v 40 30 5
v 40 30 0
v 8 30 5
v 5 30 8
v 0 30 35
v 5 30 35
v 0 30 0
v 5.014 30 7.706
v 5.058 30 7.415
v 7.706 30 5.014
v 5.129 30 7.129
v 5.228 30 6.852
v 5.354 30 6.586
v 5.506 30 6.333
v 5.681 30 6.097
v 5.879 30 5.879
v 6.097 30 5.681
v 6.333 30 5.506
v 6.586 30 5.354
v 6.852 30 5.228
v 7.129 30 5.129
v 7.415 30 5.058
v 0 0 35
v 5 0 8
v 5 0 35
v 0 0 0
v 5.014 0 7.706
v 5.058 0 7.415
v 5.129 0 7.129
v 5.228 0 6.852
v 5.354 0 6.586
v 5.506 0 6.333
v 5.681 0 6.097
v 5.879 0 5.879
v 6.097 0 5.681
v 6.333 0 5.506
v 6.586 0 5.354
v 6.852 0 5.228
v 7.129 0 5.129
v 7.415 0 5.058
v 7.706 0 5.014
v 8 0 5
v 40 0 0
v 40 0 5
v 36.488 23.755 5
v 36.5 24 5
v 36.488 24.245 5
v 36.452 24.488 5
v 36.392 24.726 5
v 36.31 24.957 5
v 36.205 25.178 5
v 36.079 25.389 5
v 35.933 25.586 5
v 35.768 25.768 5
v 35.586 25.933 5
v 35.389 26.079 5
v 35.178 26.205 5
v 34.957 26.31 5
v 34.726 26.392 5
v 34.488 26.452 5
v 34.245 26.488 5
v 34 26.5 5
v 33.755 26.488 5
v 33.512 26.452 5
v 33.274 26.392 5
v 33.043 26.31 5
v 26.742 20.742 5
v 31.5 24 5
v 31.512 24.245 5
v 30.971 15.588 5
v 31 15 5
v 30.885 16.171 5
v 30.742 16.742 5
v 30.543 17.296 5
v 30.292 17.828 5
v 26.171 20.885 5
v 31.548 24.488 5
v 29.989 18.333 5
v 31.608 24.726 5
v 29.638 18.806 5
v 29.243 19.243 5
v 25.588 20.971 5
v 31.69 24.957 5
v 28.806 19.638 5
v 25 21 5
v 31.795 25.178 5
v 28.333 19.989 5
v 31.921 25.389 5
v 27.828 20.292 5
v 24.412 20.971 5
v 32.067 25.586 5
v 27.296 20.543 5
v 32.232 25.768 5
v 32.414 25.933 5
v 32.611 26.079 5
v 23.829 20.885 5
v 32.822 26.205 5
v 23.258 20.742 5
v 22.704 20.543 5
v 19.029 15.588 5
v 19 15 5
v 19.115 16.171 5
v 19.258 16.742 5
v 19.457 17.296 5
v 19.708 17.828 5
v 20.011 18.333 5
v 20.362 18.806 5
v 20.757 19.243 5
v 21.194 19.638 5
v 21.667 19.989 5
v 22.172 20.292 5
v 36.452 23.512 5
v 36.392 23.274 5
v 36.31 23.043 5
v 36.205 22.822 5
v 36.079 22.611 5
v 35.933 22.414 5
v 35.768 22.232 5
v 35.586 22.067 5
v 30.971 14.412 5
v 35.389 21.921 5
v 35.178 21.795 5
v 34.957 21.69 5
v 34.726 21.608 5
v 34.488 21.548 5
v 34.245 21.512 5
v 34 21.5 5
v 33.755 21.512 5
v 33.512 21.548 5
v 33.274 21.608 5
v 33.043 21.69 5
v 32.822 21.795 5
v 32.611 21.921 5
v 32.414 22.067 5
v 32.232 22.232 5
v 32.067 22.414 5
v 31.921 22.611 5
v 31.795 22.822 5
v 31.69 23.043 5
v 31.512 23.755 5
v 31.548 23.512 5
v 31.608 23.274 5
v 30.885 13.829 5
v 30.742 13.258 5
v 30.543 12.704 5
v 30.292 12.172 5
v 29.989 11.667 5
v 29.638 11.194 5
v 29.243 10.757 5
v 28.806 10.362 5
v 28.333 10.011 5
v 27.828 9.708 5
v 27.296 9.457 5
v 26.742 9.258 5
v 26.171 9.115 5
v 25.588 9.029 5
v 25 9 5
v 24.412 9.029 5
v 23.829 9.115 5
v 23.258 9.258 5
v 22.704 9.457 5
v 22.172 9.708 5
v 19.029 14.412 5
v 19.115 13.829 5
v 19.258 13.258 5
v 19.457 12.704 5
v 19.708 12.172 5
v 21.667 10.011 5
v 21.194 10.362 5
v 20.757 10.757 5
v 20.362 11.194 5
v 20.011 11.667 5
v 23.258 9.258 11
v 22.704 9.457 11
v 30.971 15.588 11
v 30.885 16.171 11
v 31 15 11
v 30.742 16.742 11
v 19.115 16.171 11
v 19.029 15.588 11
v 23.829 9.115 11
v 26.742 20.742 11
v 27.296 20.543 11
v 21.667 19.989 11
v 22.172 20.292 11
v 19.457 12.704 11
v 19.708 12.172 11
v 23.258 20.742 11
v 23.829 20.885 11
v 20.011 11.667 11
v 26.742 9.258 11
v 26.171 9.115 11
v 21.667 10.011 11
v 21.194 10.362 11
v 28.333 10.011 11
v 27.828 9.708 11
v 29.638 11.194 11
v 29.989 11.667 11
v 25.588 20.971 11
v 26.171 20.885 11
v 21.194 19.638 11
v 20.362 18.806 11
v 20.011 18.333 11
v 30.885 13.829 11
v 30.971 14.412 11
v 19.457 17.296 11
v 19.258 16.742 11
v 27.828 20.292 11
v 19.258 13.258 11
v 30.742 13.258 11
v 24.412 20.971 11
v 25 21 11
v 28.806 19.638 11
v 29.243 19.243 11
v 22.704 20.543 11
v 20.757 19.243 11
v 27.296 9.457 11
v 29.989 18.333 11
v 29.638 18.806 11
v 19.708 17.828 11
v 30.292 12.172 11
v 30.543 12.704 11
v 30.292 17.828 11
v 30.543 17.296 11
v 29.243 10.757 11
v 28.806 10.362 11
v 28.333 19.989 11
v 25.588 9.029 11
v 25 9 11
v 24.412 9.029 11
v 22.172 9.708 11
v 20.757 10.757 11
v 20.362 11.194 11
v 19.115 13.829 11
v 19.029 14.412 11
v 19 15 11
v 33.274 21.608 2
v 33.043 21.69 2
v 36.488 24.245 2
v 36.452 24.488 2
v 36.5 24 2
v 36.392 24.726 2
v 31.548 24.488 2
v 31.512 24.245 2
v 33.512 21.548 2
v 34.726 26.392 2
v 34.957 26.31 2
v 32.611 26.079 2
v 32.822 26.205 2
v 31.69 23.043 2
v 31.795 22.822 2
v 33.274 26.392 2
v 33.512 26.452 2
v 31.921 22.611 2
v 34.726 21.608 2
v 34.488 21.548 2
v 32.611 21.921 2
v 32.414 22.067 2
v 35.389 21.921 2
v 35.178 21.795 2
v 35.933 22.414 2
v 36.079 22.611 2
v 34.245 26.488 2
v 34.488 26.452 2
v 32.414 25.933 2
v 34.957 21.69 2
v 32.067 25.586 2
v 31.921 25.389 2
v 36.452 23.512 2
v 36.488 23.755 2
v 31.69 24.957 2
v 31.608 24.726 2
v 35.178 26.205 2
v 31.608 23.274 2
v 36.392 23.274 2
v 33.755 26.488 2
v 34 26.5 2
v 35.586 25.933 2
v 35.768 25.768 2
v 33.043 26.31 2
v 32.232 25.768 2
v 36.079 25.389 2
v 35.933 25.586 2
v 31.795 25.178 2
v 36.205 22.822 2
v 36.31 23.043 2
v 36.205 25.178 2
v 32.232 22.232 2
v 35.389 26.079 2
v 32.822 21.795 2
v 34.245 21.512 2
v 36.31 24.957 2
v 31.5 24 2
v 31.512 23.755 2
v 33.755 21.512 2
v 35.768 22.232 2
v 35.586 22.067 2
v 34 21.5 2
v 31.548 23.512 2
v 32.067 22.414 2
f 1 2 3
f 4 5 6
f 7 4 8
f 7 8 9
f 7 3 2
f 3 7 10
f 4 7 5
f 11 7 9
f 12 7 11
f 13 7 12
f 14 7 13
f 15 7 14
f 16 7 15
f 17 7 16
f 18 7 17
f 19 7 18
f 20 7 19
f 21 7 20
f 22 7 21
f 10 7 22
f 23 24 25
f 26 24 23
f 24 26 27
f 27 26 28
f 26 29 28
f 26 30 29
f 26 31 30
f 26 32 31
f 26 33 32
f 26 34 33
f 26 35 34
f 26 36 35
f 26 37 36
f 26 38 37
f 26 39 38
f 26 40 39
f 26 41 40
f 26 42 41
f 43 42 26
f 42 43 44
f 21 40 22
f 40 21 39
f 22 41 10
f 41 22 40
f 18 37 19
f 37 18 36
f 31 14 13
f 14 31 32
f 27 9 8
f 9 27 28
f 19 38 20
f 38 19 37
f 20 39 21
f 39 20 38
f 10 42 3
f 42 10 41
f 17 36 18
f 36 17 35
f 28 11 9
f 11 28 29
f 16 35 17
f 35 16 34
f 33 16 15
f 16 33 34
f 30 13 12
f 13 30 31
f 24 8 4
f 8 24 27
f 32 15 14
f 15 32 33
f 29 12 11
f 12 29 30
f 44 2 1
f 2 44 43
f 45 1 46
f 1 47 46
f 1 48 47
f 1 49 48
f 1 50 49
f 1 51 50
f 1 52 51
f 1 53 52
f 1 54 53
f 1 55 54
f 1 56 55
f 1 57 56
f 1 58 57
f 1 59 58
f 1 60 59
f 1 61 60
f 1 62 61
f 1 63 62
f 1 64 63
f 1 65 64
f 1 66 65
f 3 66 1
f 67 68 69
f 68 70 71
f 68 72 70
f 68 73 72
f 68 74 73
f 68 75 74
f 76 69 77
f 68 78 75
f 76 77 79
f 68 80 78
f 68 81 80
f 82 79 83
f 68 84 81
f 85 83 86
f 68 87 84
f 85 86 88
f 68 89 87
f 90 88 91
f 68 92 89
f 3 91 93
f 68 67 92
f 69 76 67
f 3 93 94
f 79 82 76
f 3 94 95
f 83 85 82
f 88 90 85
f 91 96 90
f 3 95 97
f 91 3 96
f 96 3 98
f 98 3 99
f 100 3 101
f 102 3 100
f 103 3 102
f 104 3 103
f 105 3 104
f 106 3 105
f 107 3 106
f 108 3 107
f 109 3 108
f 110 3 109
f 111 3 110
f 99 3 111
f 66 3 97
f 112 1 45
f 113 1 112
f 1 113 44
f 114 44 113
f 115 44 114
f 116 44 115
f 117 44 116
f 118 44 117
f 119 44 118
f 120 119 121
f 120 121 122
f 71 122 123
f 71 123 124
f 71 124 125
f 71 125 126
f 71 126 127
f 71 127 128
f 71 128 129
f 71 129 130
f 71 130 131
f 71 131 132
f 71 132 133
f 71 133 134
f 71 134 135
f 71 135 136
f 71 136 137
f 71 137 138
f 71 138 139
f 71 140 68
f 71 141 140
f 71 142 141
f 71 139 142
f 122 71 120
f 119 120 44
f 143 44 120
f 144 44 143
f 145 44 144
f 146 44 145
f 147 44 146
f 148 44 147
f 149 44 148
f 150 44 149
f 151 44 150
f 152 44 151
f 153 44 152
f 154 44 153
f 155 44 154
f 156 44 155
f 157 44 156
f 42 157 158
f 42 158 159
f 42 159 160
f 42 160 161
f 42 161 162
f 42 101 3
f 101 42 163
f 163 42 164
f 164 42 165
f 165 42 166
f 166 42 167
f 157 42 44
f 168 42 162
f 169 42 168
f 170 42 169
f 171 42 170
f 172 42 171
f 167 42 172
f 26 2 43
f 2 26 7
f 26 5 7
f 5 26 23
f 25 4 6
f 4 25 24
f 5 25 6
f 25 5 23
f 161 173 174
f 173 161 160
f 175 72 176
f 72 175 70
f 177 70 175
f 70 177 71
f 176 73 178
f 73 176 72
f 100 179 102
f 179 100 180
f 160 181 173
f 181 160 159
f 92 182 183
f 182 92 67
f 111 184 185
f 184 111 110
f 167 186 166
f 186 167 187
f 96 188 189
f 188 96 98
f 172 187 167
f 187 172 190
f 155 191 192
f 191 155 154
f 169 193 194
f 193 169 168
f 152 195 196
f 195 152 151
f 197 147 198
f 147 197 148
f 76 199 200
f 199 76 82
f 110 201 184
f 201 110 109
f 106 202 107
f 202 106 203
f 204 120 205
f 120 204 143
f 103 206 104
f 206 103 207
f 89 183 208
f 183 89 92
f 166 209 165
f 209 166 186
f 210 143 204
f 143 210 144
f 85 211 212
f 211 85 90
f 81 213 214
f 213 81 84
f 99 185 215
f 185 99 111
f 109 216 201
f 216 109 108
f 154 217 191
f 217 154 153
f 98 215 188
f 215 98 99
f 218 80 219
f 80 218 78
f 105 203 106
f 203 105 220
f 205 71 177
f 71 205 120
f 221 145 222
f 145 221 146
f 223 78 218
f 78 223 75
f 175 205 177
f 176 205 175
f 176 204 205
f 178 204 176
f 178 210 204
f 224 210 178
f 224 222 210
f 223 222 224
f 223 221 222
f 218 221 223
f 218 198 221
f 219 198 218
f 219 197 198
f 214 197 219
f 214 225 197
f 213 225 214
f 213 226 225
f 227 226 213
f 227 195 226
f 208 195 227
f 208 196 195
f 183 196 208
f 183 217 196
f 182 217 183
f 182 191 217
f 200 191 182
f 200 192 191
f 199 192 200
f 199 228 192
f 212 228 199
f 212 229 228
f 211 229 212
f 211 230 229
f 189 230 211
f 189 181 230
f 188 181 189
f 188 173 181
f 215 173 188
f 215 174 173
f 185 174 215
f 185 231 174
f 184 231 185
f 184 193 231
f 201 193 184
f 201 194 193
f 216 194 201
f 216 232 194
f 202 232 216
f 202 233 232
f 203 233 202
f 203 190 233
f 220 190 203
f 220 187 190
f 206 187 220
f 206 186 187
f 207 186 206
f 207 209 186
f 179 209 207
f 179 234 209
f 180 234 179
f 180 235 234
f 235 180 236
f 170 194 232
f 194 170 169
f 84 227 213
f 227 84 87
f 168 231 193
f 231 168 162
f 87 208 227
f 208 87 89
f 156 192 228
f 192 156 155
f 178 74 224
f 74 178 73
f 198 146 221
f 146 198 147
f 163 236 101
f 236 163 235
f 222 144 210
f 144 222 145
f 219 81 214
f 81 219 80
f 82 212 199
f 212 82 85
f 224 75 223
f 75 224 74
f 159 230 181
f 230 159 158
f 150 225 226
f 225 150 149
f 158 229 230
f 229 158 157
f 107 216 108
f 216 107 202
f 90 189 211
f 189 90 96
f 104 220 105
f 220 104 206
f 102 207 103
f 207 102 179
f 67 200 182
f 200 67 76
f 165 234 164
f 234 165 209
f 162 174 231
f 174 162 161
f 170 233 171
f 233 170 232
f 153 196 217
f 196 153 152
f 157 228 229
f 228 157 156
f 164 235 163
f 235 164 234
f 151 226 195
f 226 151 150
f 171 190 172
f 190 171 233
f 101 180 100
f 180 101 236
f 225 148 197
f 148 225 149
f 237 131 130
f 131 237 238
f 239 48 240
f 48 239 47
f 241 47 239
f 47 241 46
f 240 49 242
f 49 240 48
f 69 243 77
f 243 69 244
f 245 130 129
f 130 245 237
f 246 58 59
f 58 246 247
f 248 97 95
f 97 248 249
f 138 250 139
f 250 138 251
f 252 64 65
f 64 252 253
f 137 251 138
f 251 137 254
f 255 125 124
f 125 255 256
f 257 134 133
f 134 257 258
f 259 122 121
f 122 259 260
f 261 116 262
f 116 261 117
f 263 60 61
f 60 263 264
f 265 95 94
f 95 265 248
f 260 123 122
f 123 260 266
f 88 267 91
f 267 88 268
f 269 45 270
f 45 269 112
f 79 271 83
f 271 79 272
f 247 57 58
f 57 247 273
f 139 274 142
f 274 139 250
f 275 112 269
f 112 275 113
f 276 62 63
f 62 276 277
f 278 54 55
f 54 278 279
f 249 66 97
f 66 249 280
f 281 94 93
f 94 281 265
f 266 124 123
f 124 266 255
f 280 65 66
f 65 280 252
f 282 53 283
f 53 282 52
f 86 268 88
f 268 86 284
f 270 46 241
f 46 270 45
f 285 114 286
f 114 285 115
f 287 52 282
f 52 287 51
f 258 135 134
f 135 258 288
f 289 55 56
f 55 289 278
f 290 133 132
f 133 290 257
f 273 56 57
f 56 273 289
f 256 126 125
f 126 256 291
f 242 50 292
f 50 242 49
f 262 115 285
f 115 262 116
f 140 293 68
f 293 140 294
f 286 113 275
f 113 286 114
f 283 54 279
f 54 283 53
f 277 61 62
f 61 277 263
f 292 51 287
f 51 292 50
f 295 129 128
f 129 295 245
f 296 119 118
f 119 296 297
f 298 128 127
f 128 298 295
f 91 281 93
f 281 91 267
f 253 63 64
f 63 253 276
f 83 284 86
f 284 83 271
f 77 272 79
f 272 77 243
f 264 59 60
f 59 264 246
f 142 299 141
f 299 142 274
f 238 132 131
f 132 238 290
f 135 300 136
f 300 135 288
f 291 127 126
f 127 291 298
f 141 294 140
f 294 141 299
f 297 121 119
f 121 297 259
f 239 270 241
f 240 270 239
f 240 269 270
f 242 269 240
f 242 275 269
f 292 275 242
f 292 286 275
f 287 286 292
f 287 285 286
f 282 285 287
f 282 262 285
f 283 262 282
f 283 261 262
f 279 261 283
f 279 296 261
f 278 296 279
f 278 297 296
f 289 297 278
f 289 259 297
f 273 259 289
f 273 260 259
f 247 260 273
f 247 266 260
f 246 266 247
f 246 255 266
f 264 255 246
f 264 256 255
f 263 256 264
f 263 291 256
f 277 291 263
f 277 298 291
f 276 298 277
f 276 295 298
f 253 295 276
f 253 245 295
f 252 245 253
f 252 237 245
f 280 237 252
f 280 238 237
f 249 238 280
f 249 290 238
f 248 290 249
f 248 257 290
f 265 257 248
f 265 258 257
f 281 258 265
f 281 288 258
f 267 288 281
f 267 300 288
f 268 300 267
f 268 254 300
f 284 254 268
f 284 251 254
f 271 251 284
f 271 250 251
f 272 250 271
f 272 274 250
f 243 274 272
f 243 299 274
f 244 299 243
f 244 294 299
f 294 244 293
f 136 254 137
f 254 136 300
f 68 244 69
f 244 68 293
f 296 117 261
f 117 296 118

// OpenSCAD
// Composite bracket: ground truth for the segmentation pipeline.
// See docs/planning/segmentation_composite_bracket.md and composite_bracket_expected.json.
// Hand-written (not generated from the feature-fixture manifest).
$fn = 64;

module composite_bracket() {
    difference() {
        union() {
            cube([40, 30, 5]);                          // base
            cube([5, 30, 35]);                          // wall
            difference() {                              // R3 fillet, inner corner, axis Y
                translate([4, 0, 4]) cube([4, 30, 4]);
                translate([8, -1, 8]) rotate([-90, 0, 0]) cylinder(r = 3, h = 32);
            }
            translate([25, 15, 4]) cylinder(r = 6, h = 7);   // boss, top at z = 11
        }
        translate([34, 24, 2]) cylinder(r = 2.5, h = 4);     // blind hole, floor at z = 2
    }
}

composite_bracket();
